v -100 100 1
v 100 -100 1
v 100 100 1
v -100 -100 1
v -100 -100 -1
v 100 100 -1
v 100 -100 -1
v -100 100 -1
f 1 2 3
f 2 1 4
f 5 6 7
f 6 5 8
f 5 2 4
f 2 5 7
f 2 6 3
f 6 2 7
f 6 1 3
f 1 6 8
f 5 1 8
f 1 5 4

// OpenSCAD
$fn = 64;

length = 200;
width  = 200;
thickness = 2;

// Ensure a visible, non-zero thickness
t = max(thickness, 0.5);

// Single connected solid: a simple sheet
cube([length, width, t], center=true);
